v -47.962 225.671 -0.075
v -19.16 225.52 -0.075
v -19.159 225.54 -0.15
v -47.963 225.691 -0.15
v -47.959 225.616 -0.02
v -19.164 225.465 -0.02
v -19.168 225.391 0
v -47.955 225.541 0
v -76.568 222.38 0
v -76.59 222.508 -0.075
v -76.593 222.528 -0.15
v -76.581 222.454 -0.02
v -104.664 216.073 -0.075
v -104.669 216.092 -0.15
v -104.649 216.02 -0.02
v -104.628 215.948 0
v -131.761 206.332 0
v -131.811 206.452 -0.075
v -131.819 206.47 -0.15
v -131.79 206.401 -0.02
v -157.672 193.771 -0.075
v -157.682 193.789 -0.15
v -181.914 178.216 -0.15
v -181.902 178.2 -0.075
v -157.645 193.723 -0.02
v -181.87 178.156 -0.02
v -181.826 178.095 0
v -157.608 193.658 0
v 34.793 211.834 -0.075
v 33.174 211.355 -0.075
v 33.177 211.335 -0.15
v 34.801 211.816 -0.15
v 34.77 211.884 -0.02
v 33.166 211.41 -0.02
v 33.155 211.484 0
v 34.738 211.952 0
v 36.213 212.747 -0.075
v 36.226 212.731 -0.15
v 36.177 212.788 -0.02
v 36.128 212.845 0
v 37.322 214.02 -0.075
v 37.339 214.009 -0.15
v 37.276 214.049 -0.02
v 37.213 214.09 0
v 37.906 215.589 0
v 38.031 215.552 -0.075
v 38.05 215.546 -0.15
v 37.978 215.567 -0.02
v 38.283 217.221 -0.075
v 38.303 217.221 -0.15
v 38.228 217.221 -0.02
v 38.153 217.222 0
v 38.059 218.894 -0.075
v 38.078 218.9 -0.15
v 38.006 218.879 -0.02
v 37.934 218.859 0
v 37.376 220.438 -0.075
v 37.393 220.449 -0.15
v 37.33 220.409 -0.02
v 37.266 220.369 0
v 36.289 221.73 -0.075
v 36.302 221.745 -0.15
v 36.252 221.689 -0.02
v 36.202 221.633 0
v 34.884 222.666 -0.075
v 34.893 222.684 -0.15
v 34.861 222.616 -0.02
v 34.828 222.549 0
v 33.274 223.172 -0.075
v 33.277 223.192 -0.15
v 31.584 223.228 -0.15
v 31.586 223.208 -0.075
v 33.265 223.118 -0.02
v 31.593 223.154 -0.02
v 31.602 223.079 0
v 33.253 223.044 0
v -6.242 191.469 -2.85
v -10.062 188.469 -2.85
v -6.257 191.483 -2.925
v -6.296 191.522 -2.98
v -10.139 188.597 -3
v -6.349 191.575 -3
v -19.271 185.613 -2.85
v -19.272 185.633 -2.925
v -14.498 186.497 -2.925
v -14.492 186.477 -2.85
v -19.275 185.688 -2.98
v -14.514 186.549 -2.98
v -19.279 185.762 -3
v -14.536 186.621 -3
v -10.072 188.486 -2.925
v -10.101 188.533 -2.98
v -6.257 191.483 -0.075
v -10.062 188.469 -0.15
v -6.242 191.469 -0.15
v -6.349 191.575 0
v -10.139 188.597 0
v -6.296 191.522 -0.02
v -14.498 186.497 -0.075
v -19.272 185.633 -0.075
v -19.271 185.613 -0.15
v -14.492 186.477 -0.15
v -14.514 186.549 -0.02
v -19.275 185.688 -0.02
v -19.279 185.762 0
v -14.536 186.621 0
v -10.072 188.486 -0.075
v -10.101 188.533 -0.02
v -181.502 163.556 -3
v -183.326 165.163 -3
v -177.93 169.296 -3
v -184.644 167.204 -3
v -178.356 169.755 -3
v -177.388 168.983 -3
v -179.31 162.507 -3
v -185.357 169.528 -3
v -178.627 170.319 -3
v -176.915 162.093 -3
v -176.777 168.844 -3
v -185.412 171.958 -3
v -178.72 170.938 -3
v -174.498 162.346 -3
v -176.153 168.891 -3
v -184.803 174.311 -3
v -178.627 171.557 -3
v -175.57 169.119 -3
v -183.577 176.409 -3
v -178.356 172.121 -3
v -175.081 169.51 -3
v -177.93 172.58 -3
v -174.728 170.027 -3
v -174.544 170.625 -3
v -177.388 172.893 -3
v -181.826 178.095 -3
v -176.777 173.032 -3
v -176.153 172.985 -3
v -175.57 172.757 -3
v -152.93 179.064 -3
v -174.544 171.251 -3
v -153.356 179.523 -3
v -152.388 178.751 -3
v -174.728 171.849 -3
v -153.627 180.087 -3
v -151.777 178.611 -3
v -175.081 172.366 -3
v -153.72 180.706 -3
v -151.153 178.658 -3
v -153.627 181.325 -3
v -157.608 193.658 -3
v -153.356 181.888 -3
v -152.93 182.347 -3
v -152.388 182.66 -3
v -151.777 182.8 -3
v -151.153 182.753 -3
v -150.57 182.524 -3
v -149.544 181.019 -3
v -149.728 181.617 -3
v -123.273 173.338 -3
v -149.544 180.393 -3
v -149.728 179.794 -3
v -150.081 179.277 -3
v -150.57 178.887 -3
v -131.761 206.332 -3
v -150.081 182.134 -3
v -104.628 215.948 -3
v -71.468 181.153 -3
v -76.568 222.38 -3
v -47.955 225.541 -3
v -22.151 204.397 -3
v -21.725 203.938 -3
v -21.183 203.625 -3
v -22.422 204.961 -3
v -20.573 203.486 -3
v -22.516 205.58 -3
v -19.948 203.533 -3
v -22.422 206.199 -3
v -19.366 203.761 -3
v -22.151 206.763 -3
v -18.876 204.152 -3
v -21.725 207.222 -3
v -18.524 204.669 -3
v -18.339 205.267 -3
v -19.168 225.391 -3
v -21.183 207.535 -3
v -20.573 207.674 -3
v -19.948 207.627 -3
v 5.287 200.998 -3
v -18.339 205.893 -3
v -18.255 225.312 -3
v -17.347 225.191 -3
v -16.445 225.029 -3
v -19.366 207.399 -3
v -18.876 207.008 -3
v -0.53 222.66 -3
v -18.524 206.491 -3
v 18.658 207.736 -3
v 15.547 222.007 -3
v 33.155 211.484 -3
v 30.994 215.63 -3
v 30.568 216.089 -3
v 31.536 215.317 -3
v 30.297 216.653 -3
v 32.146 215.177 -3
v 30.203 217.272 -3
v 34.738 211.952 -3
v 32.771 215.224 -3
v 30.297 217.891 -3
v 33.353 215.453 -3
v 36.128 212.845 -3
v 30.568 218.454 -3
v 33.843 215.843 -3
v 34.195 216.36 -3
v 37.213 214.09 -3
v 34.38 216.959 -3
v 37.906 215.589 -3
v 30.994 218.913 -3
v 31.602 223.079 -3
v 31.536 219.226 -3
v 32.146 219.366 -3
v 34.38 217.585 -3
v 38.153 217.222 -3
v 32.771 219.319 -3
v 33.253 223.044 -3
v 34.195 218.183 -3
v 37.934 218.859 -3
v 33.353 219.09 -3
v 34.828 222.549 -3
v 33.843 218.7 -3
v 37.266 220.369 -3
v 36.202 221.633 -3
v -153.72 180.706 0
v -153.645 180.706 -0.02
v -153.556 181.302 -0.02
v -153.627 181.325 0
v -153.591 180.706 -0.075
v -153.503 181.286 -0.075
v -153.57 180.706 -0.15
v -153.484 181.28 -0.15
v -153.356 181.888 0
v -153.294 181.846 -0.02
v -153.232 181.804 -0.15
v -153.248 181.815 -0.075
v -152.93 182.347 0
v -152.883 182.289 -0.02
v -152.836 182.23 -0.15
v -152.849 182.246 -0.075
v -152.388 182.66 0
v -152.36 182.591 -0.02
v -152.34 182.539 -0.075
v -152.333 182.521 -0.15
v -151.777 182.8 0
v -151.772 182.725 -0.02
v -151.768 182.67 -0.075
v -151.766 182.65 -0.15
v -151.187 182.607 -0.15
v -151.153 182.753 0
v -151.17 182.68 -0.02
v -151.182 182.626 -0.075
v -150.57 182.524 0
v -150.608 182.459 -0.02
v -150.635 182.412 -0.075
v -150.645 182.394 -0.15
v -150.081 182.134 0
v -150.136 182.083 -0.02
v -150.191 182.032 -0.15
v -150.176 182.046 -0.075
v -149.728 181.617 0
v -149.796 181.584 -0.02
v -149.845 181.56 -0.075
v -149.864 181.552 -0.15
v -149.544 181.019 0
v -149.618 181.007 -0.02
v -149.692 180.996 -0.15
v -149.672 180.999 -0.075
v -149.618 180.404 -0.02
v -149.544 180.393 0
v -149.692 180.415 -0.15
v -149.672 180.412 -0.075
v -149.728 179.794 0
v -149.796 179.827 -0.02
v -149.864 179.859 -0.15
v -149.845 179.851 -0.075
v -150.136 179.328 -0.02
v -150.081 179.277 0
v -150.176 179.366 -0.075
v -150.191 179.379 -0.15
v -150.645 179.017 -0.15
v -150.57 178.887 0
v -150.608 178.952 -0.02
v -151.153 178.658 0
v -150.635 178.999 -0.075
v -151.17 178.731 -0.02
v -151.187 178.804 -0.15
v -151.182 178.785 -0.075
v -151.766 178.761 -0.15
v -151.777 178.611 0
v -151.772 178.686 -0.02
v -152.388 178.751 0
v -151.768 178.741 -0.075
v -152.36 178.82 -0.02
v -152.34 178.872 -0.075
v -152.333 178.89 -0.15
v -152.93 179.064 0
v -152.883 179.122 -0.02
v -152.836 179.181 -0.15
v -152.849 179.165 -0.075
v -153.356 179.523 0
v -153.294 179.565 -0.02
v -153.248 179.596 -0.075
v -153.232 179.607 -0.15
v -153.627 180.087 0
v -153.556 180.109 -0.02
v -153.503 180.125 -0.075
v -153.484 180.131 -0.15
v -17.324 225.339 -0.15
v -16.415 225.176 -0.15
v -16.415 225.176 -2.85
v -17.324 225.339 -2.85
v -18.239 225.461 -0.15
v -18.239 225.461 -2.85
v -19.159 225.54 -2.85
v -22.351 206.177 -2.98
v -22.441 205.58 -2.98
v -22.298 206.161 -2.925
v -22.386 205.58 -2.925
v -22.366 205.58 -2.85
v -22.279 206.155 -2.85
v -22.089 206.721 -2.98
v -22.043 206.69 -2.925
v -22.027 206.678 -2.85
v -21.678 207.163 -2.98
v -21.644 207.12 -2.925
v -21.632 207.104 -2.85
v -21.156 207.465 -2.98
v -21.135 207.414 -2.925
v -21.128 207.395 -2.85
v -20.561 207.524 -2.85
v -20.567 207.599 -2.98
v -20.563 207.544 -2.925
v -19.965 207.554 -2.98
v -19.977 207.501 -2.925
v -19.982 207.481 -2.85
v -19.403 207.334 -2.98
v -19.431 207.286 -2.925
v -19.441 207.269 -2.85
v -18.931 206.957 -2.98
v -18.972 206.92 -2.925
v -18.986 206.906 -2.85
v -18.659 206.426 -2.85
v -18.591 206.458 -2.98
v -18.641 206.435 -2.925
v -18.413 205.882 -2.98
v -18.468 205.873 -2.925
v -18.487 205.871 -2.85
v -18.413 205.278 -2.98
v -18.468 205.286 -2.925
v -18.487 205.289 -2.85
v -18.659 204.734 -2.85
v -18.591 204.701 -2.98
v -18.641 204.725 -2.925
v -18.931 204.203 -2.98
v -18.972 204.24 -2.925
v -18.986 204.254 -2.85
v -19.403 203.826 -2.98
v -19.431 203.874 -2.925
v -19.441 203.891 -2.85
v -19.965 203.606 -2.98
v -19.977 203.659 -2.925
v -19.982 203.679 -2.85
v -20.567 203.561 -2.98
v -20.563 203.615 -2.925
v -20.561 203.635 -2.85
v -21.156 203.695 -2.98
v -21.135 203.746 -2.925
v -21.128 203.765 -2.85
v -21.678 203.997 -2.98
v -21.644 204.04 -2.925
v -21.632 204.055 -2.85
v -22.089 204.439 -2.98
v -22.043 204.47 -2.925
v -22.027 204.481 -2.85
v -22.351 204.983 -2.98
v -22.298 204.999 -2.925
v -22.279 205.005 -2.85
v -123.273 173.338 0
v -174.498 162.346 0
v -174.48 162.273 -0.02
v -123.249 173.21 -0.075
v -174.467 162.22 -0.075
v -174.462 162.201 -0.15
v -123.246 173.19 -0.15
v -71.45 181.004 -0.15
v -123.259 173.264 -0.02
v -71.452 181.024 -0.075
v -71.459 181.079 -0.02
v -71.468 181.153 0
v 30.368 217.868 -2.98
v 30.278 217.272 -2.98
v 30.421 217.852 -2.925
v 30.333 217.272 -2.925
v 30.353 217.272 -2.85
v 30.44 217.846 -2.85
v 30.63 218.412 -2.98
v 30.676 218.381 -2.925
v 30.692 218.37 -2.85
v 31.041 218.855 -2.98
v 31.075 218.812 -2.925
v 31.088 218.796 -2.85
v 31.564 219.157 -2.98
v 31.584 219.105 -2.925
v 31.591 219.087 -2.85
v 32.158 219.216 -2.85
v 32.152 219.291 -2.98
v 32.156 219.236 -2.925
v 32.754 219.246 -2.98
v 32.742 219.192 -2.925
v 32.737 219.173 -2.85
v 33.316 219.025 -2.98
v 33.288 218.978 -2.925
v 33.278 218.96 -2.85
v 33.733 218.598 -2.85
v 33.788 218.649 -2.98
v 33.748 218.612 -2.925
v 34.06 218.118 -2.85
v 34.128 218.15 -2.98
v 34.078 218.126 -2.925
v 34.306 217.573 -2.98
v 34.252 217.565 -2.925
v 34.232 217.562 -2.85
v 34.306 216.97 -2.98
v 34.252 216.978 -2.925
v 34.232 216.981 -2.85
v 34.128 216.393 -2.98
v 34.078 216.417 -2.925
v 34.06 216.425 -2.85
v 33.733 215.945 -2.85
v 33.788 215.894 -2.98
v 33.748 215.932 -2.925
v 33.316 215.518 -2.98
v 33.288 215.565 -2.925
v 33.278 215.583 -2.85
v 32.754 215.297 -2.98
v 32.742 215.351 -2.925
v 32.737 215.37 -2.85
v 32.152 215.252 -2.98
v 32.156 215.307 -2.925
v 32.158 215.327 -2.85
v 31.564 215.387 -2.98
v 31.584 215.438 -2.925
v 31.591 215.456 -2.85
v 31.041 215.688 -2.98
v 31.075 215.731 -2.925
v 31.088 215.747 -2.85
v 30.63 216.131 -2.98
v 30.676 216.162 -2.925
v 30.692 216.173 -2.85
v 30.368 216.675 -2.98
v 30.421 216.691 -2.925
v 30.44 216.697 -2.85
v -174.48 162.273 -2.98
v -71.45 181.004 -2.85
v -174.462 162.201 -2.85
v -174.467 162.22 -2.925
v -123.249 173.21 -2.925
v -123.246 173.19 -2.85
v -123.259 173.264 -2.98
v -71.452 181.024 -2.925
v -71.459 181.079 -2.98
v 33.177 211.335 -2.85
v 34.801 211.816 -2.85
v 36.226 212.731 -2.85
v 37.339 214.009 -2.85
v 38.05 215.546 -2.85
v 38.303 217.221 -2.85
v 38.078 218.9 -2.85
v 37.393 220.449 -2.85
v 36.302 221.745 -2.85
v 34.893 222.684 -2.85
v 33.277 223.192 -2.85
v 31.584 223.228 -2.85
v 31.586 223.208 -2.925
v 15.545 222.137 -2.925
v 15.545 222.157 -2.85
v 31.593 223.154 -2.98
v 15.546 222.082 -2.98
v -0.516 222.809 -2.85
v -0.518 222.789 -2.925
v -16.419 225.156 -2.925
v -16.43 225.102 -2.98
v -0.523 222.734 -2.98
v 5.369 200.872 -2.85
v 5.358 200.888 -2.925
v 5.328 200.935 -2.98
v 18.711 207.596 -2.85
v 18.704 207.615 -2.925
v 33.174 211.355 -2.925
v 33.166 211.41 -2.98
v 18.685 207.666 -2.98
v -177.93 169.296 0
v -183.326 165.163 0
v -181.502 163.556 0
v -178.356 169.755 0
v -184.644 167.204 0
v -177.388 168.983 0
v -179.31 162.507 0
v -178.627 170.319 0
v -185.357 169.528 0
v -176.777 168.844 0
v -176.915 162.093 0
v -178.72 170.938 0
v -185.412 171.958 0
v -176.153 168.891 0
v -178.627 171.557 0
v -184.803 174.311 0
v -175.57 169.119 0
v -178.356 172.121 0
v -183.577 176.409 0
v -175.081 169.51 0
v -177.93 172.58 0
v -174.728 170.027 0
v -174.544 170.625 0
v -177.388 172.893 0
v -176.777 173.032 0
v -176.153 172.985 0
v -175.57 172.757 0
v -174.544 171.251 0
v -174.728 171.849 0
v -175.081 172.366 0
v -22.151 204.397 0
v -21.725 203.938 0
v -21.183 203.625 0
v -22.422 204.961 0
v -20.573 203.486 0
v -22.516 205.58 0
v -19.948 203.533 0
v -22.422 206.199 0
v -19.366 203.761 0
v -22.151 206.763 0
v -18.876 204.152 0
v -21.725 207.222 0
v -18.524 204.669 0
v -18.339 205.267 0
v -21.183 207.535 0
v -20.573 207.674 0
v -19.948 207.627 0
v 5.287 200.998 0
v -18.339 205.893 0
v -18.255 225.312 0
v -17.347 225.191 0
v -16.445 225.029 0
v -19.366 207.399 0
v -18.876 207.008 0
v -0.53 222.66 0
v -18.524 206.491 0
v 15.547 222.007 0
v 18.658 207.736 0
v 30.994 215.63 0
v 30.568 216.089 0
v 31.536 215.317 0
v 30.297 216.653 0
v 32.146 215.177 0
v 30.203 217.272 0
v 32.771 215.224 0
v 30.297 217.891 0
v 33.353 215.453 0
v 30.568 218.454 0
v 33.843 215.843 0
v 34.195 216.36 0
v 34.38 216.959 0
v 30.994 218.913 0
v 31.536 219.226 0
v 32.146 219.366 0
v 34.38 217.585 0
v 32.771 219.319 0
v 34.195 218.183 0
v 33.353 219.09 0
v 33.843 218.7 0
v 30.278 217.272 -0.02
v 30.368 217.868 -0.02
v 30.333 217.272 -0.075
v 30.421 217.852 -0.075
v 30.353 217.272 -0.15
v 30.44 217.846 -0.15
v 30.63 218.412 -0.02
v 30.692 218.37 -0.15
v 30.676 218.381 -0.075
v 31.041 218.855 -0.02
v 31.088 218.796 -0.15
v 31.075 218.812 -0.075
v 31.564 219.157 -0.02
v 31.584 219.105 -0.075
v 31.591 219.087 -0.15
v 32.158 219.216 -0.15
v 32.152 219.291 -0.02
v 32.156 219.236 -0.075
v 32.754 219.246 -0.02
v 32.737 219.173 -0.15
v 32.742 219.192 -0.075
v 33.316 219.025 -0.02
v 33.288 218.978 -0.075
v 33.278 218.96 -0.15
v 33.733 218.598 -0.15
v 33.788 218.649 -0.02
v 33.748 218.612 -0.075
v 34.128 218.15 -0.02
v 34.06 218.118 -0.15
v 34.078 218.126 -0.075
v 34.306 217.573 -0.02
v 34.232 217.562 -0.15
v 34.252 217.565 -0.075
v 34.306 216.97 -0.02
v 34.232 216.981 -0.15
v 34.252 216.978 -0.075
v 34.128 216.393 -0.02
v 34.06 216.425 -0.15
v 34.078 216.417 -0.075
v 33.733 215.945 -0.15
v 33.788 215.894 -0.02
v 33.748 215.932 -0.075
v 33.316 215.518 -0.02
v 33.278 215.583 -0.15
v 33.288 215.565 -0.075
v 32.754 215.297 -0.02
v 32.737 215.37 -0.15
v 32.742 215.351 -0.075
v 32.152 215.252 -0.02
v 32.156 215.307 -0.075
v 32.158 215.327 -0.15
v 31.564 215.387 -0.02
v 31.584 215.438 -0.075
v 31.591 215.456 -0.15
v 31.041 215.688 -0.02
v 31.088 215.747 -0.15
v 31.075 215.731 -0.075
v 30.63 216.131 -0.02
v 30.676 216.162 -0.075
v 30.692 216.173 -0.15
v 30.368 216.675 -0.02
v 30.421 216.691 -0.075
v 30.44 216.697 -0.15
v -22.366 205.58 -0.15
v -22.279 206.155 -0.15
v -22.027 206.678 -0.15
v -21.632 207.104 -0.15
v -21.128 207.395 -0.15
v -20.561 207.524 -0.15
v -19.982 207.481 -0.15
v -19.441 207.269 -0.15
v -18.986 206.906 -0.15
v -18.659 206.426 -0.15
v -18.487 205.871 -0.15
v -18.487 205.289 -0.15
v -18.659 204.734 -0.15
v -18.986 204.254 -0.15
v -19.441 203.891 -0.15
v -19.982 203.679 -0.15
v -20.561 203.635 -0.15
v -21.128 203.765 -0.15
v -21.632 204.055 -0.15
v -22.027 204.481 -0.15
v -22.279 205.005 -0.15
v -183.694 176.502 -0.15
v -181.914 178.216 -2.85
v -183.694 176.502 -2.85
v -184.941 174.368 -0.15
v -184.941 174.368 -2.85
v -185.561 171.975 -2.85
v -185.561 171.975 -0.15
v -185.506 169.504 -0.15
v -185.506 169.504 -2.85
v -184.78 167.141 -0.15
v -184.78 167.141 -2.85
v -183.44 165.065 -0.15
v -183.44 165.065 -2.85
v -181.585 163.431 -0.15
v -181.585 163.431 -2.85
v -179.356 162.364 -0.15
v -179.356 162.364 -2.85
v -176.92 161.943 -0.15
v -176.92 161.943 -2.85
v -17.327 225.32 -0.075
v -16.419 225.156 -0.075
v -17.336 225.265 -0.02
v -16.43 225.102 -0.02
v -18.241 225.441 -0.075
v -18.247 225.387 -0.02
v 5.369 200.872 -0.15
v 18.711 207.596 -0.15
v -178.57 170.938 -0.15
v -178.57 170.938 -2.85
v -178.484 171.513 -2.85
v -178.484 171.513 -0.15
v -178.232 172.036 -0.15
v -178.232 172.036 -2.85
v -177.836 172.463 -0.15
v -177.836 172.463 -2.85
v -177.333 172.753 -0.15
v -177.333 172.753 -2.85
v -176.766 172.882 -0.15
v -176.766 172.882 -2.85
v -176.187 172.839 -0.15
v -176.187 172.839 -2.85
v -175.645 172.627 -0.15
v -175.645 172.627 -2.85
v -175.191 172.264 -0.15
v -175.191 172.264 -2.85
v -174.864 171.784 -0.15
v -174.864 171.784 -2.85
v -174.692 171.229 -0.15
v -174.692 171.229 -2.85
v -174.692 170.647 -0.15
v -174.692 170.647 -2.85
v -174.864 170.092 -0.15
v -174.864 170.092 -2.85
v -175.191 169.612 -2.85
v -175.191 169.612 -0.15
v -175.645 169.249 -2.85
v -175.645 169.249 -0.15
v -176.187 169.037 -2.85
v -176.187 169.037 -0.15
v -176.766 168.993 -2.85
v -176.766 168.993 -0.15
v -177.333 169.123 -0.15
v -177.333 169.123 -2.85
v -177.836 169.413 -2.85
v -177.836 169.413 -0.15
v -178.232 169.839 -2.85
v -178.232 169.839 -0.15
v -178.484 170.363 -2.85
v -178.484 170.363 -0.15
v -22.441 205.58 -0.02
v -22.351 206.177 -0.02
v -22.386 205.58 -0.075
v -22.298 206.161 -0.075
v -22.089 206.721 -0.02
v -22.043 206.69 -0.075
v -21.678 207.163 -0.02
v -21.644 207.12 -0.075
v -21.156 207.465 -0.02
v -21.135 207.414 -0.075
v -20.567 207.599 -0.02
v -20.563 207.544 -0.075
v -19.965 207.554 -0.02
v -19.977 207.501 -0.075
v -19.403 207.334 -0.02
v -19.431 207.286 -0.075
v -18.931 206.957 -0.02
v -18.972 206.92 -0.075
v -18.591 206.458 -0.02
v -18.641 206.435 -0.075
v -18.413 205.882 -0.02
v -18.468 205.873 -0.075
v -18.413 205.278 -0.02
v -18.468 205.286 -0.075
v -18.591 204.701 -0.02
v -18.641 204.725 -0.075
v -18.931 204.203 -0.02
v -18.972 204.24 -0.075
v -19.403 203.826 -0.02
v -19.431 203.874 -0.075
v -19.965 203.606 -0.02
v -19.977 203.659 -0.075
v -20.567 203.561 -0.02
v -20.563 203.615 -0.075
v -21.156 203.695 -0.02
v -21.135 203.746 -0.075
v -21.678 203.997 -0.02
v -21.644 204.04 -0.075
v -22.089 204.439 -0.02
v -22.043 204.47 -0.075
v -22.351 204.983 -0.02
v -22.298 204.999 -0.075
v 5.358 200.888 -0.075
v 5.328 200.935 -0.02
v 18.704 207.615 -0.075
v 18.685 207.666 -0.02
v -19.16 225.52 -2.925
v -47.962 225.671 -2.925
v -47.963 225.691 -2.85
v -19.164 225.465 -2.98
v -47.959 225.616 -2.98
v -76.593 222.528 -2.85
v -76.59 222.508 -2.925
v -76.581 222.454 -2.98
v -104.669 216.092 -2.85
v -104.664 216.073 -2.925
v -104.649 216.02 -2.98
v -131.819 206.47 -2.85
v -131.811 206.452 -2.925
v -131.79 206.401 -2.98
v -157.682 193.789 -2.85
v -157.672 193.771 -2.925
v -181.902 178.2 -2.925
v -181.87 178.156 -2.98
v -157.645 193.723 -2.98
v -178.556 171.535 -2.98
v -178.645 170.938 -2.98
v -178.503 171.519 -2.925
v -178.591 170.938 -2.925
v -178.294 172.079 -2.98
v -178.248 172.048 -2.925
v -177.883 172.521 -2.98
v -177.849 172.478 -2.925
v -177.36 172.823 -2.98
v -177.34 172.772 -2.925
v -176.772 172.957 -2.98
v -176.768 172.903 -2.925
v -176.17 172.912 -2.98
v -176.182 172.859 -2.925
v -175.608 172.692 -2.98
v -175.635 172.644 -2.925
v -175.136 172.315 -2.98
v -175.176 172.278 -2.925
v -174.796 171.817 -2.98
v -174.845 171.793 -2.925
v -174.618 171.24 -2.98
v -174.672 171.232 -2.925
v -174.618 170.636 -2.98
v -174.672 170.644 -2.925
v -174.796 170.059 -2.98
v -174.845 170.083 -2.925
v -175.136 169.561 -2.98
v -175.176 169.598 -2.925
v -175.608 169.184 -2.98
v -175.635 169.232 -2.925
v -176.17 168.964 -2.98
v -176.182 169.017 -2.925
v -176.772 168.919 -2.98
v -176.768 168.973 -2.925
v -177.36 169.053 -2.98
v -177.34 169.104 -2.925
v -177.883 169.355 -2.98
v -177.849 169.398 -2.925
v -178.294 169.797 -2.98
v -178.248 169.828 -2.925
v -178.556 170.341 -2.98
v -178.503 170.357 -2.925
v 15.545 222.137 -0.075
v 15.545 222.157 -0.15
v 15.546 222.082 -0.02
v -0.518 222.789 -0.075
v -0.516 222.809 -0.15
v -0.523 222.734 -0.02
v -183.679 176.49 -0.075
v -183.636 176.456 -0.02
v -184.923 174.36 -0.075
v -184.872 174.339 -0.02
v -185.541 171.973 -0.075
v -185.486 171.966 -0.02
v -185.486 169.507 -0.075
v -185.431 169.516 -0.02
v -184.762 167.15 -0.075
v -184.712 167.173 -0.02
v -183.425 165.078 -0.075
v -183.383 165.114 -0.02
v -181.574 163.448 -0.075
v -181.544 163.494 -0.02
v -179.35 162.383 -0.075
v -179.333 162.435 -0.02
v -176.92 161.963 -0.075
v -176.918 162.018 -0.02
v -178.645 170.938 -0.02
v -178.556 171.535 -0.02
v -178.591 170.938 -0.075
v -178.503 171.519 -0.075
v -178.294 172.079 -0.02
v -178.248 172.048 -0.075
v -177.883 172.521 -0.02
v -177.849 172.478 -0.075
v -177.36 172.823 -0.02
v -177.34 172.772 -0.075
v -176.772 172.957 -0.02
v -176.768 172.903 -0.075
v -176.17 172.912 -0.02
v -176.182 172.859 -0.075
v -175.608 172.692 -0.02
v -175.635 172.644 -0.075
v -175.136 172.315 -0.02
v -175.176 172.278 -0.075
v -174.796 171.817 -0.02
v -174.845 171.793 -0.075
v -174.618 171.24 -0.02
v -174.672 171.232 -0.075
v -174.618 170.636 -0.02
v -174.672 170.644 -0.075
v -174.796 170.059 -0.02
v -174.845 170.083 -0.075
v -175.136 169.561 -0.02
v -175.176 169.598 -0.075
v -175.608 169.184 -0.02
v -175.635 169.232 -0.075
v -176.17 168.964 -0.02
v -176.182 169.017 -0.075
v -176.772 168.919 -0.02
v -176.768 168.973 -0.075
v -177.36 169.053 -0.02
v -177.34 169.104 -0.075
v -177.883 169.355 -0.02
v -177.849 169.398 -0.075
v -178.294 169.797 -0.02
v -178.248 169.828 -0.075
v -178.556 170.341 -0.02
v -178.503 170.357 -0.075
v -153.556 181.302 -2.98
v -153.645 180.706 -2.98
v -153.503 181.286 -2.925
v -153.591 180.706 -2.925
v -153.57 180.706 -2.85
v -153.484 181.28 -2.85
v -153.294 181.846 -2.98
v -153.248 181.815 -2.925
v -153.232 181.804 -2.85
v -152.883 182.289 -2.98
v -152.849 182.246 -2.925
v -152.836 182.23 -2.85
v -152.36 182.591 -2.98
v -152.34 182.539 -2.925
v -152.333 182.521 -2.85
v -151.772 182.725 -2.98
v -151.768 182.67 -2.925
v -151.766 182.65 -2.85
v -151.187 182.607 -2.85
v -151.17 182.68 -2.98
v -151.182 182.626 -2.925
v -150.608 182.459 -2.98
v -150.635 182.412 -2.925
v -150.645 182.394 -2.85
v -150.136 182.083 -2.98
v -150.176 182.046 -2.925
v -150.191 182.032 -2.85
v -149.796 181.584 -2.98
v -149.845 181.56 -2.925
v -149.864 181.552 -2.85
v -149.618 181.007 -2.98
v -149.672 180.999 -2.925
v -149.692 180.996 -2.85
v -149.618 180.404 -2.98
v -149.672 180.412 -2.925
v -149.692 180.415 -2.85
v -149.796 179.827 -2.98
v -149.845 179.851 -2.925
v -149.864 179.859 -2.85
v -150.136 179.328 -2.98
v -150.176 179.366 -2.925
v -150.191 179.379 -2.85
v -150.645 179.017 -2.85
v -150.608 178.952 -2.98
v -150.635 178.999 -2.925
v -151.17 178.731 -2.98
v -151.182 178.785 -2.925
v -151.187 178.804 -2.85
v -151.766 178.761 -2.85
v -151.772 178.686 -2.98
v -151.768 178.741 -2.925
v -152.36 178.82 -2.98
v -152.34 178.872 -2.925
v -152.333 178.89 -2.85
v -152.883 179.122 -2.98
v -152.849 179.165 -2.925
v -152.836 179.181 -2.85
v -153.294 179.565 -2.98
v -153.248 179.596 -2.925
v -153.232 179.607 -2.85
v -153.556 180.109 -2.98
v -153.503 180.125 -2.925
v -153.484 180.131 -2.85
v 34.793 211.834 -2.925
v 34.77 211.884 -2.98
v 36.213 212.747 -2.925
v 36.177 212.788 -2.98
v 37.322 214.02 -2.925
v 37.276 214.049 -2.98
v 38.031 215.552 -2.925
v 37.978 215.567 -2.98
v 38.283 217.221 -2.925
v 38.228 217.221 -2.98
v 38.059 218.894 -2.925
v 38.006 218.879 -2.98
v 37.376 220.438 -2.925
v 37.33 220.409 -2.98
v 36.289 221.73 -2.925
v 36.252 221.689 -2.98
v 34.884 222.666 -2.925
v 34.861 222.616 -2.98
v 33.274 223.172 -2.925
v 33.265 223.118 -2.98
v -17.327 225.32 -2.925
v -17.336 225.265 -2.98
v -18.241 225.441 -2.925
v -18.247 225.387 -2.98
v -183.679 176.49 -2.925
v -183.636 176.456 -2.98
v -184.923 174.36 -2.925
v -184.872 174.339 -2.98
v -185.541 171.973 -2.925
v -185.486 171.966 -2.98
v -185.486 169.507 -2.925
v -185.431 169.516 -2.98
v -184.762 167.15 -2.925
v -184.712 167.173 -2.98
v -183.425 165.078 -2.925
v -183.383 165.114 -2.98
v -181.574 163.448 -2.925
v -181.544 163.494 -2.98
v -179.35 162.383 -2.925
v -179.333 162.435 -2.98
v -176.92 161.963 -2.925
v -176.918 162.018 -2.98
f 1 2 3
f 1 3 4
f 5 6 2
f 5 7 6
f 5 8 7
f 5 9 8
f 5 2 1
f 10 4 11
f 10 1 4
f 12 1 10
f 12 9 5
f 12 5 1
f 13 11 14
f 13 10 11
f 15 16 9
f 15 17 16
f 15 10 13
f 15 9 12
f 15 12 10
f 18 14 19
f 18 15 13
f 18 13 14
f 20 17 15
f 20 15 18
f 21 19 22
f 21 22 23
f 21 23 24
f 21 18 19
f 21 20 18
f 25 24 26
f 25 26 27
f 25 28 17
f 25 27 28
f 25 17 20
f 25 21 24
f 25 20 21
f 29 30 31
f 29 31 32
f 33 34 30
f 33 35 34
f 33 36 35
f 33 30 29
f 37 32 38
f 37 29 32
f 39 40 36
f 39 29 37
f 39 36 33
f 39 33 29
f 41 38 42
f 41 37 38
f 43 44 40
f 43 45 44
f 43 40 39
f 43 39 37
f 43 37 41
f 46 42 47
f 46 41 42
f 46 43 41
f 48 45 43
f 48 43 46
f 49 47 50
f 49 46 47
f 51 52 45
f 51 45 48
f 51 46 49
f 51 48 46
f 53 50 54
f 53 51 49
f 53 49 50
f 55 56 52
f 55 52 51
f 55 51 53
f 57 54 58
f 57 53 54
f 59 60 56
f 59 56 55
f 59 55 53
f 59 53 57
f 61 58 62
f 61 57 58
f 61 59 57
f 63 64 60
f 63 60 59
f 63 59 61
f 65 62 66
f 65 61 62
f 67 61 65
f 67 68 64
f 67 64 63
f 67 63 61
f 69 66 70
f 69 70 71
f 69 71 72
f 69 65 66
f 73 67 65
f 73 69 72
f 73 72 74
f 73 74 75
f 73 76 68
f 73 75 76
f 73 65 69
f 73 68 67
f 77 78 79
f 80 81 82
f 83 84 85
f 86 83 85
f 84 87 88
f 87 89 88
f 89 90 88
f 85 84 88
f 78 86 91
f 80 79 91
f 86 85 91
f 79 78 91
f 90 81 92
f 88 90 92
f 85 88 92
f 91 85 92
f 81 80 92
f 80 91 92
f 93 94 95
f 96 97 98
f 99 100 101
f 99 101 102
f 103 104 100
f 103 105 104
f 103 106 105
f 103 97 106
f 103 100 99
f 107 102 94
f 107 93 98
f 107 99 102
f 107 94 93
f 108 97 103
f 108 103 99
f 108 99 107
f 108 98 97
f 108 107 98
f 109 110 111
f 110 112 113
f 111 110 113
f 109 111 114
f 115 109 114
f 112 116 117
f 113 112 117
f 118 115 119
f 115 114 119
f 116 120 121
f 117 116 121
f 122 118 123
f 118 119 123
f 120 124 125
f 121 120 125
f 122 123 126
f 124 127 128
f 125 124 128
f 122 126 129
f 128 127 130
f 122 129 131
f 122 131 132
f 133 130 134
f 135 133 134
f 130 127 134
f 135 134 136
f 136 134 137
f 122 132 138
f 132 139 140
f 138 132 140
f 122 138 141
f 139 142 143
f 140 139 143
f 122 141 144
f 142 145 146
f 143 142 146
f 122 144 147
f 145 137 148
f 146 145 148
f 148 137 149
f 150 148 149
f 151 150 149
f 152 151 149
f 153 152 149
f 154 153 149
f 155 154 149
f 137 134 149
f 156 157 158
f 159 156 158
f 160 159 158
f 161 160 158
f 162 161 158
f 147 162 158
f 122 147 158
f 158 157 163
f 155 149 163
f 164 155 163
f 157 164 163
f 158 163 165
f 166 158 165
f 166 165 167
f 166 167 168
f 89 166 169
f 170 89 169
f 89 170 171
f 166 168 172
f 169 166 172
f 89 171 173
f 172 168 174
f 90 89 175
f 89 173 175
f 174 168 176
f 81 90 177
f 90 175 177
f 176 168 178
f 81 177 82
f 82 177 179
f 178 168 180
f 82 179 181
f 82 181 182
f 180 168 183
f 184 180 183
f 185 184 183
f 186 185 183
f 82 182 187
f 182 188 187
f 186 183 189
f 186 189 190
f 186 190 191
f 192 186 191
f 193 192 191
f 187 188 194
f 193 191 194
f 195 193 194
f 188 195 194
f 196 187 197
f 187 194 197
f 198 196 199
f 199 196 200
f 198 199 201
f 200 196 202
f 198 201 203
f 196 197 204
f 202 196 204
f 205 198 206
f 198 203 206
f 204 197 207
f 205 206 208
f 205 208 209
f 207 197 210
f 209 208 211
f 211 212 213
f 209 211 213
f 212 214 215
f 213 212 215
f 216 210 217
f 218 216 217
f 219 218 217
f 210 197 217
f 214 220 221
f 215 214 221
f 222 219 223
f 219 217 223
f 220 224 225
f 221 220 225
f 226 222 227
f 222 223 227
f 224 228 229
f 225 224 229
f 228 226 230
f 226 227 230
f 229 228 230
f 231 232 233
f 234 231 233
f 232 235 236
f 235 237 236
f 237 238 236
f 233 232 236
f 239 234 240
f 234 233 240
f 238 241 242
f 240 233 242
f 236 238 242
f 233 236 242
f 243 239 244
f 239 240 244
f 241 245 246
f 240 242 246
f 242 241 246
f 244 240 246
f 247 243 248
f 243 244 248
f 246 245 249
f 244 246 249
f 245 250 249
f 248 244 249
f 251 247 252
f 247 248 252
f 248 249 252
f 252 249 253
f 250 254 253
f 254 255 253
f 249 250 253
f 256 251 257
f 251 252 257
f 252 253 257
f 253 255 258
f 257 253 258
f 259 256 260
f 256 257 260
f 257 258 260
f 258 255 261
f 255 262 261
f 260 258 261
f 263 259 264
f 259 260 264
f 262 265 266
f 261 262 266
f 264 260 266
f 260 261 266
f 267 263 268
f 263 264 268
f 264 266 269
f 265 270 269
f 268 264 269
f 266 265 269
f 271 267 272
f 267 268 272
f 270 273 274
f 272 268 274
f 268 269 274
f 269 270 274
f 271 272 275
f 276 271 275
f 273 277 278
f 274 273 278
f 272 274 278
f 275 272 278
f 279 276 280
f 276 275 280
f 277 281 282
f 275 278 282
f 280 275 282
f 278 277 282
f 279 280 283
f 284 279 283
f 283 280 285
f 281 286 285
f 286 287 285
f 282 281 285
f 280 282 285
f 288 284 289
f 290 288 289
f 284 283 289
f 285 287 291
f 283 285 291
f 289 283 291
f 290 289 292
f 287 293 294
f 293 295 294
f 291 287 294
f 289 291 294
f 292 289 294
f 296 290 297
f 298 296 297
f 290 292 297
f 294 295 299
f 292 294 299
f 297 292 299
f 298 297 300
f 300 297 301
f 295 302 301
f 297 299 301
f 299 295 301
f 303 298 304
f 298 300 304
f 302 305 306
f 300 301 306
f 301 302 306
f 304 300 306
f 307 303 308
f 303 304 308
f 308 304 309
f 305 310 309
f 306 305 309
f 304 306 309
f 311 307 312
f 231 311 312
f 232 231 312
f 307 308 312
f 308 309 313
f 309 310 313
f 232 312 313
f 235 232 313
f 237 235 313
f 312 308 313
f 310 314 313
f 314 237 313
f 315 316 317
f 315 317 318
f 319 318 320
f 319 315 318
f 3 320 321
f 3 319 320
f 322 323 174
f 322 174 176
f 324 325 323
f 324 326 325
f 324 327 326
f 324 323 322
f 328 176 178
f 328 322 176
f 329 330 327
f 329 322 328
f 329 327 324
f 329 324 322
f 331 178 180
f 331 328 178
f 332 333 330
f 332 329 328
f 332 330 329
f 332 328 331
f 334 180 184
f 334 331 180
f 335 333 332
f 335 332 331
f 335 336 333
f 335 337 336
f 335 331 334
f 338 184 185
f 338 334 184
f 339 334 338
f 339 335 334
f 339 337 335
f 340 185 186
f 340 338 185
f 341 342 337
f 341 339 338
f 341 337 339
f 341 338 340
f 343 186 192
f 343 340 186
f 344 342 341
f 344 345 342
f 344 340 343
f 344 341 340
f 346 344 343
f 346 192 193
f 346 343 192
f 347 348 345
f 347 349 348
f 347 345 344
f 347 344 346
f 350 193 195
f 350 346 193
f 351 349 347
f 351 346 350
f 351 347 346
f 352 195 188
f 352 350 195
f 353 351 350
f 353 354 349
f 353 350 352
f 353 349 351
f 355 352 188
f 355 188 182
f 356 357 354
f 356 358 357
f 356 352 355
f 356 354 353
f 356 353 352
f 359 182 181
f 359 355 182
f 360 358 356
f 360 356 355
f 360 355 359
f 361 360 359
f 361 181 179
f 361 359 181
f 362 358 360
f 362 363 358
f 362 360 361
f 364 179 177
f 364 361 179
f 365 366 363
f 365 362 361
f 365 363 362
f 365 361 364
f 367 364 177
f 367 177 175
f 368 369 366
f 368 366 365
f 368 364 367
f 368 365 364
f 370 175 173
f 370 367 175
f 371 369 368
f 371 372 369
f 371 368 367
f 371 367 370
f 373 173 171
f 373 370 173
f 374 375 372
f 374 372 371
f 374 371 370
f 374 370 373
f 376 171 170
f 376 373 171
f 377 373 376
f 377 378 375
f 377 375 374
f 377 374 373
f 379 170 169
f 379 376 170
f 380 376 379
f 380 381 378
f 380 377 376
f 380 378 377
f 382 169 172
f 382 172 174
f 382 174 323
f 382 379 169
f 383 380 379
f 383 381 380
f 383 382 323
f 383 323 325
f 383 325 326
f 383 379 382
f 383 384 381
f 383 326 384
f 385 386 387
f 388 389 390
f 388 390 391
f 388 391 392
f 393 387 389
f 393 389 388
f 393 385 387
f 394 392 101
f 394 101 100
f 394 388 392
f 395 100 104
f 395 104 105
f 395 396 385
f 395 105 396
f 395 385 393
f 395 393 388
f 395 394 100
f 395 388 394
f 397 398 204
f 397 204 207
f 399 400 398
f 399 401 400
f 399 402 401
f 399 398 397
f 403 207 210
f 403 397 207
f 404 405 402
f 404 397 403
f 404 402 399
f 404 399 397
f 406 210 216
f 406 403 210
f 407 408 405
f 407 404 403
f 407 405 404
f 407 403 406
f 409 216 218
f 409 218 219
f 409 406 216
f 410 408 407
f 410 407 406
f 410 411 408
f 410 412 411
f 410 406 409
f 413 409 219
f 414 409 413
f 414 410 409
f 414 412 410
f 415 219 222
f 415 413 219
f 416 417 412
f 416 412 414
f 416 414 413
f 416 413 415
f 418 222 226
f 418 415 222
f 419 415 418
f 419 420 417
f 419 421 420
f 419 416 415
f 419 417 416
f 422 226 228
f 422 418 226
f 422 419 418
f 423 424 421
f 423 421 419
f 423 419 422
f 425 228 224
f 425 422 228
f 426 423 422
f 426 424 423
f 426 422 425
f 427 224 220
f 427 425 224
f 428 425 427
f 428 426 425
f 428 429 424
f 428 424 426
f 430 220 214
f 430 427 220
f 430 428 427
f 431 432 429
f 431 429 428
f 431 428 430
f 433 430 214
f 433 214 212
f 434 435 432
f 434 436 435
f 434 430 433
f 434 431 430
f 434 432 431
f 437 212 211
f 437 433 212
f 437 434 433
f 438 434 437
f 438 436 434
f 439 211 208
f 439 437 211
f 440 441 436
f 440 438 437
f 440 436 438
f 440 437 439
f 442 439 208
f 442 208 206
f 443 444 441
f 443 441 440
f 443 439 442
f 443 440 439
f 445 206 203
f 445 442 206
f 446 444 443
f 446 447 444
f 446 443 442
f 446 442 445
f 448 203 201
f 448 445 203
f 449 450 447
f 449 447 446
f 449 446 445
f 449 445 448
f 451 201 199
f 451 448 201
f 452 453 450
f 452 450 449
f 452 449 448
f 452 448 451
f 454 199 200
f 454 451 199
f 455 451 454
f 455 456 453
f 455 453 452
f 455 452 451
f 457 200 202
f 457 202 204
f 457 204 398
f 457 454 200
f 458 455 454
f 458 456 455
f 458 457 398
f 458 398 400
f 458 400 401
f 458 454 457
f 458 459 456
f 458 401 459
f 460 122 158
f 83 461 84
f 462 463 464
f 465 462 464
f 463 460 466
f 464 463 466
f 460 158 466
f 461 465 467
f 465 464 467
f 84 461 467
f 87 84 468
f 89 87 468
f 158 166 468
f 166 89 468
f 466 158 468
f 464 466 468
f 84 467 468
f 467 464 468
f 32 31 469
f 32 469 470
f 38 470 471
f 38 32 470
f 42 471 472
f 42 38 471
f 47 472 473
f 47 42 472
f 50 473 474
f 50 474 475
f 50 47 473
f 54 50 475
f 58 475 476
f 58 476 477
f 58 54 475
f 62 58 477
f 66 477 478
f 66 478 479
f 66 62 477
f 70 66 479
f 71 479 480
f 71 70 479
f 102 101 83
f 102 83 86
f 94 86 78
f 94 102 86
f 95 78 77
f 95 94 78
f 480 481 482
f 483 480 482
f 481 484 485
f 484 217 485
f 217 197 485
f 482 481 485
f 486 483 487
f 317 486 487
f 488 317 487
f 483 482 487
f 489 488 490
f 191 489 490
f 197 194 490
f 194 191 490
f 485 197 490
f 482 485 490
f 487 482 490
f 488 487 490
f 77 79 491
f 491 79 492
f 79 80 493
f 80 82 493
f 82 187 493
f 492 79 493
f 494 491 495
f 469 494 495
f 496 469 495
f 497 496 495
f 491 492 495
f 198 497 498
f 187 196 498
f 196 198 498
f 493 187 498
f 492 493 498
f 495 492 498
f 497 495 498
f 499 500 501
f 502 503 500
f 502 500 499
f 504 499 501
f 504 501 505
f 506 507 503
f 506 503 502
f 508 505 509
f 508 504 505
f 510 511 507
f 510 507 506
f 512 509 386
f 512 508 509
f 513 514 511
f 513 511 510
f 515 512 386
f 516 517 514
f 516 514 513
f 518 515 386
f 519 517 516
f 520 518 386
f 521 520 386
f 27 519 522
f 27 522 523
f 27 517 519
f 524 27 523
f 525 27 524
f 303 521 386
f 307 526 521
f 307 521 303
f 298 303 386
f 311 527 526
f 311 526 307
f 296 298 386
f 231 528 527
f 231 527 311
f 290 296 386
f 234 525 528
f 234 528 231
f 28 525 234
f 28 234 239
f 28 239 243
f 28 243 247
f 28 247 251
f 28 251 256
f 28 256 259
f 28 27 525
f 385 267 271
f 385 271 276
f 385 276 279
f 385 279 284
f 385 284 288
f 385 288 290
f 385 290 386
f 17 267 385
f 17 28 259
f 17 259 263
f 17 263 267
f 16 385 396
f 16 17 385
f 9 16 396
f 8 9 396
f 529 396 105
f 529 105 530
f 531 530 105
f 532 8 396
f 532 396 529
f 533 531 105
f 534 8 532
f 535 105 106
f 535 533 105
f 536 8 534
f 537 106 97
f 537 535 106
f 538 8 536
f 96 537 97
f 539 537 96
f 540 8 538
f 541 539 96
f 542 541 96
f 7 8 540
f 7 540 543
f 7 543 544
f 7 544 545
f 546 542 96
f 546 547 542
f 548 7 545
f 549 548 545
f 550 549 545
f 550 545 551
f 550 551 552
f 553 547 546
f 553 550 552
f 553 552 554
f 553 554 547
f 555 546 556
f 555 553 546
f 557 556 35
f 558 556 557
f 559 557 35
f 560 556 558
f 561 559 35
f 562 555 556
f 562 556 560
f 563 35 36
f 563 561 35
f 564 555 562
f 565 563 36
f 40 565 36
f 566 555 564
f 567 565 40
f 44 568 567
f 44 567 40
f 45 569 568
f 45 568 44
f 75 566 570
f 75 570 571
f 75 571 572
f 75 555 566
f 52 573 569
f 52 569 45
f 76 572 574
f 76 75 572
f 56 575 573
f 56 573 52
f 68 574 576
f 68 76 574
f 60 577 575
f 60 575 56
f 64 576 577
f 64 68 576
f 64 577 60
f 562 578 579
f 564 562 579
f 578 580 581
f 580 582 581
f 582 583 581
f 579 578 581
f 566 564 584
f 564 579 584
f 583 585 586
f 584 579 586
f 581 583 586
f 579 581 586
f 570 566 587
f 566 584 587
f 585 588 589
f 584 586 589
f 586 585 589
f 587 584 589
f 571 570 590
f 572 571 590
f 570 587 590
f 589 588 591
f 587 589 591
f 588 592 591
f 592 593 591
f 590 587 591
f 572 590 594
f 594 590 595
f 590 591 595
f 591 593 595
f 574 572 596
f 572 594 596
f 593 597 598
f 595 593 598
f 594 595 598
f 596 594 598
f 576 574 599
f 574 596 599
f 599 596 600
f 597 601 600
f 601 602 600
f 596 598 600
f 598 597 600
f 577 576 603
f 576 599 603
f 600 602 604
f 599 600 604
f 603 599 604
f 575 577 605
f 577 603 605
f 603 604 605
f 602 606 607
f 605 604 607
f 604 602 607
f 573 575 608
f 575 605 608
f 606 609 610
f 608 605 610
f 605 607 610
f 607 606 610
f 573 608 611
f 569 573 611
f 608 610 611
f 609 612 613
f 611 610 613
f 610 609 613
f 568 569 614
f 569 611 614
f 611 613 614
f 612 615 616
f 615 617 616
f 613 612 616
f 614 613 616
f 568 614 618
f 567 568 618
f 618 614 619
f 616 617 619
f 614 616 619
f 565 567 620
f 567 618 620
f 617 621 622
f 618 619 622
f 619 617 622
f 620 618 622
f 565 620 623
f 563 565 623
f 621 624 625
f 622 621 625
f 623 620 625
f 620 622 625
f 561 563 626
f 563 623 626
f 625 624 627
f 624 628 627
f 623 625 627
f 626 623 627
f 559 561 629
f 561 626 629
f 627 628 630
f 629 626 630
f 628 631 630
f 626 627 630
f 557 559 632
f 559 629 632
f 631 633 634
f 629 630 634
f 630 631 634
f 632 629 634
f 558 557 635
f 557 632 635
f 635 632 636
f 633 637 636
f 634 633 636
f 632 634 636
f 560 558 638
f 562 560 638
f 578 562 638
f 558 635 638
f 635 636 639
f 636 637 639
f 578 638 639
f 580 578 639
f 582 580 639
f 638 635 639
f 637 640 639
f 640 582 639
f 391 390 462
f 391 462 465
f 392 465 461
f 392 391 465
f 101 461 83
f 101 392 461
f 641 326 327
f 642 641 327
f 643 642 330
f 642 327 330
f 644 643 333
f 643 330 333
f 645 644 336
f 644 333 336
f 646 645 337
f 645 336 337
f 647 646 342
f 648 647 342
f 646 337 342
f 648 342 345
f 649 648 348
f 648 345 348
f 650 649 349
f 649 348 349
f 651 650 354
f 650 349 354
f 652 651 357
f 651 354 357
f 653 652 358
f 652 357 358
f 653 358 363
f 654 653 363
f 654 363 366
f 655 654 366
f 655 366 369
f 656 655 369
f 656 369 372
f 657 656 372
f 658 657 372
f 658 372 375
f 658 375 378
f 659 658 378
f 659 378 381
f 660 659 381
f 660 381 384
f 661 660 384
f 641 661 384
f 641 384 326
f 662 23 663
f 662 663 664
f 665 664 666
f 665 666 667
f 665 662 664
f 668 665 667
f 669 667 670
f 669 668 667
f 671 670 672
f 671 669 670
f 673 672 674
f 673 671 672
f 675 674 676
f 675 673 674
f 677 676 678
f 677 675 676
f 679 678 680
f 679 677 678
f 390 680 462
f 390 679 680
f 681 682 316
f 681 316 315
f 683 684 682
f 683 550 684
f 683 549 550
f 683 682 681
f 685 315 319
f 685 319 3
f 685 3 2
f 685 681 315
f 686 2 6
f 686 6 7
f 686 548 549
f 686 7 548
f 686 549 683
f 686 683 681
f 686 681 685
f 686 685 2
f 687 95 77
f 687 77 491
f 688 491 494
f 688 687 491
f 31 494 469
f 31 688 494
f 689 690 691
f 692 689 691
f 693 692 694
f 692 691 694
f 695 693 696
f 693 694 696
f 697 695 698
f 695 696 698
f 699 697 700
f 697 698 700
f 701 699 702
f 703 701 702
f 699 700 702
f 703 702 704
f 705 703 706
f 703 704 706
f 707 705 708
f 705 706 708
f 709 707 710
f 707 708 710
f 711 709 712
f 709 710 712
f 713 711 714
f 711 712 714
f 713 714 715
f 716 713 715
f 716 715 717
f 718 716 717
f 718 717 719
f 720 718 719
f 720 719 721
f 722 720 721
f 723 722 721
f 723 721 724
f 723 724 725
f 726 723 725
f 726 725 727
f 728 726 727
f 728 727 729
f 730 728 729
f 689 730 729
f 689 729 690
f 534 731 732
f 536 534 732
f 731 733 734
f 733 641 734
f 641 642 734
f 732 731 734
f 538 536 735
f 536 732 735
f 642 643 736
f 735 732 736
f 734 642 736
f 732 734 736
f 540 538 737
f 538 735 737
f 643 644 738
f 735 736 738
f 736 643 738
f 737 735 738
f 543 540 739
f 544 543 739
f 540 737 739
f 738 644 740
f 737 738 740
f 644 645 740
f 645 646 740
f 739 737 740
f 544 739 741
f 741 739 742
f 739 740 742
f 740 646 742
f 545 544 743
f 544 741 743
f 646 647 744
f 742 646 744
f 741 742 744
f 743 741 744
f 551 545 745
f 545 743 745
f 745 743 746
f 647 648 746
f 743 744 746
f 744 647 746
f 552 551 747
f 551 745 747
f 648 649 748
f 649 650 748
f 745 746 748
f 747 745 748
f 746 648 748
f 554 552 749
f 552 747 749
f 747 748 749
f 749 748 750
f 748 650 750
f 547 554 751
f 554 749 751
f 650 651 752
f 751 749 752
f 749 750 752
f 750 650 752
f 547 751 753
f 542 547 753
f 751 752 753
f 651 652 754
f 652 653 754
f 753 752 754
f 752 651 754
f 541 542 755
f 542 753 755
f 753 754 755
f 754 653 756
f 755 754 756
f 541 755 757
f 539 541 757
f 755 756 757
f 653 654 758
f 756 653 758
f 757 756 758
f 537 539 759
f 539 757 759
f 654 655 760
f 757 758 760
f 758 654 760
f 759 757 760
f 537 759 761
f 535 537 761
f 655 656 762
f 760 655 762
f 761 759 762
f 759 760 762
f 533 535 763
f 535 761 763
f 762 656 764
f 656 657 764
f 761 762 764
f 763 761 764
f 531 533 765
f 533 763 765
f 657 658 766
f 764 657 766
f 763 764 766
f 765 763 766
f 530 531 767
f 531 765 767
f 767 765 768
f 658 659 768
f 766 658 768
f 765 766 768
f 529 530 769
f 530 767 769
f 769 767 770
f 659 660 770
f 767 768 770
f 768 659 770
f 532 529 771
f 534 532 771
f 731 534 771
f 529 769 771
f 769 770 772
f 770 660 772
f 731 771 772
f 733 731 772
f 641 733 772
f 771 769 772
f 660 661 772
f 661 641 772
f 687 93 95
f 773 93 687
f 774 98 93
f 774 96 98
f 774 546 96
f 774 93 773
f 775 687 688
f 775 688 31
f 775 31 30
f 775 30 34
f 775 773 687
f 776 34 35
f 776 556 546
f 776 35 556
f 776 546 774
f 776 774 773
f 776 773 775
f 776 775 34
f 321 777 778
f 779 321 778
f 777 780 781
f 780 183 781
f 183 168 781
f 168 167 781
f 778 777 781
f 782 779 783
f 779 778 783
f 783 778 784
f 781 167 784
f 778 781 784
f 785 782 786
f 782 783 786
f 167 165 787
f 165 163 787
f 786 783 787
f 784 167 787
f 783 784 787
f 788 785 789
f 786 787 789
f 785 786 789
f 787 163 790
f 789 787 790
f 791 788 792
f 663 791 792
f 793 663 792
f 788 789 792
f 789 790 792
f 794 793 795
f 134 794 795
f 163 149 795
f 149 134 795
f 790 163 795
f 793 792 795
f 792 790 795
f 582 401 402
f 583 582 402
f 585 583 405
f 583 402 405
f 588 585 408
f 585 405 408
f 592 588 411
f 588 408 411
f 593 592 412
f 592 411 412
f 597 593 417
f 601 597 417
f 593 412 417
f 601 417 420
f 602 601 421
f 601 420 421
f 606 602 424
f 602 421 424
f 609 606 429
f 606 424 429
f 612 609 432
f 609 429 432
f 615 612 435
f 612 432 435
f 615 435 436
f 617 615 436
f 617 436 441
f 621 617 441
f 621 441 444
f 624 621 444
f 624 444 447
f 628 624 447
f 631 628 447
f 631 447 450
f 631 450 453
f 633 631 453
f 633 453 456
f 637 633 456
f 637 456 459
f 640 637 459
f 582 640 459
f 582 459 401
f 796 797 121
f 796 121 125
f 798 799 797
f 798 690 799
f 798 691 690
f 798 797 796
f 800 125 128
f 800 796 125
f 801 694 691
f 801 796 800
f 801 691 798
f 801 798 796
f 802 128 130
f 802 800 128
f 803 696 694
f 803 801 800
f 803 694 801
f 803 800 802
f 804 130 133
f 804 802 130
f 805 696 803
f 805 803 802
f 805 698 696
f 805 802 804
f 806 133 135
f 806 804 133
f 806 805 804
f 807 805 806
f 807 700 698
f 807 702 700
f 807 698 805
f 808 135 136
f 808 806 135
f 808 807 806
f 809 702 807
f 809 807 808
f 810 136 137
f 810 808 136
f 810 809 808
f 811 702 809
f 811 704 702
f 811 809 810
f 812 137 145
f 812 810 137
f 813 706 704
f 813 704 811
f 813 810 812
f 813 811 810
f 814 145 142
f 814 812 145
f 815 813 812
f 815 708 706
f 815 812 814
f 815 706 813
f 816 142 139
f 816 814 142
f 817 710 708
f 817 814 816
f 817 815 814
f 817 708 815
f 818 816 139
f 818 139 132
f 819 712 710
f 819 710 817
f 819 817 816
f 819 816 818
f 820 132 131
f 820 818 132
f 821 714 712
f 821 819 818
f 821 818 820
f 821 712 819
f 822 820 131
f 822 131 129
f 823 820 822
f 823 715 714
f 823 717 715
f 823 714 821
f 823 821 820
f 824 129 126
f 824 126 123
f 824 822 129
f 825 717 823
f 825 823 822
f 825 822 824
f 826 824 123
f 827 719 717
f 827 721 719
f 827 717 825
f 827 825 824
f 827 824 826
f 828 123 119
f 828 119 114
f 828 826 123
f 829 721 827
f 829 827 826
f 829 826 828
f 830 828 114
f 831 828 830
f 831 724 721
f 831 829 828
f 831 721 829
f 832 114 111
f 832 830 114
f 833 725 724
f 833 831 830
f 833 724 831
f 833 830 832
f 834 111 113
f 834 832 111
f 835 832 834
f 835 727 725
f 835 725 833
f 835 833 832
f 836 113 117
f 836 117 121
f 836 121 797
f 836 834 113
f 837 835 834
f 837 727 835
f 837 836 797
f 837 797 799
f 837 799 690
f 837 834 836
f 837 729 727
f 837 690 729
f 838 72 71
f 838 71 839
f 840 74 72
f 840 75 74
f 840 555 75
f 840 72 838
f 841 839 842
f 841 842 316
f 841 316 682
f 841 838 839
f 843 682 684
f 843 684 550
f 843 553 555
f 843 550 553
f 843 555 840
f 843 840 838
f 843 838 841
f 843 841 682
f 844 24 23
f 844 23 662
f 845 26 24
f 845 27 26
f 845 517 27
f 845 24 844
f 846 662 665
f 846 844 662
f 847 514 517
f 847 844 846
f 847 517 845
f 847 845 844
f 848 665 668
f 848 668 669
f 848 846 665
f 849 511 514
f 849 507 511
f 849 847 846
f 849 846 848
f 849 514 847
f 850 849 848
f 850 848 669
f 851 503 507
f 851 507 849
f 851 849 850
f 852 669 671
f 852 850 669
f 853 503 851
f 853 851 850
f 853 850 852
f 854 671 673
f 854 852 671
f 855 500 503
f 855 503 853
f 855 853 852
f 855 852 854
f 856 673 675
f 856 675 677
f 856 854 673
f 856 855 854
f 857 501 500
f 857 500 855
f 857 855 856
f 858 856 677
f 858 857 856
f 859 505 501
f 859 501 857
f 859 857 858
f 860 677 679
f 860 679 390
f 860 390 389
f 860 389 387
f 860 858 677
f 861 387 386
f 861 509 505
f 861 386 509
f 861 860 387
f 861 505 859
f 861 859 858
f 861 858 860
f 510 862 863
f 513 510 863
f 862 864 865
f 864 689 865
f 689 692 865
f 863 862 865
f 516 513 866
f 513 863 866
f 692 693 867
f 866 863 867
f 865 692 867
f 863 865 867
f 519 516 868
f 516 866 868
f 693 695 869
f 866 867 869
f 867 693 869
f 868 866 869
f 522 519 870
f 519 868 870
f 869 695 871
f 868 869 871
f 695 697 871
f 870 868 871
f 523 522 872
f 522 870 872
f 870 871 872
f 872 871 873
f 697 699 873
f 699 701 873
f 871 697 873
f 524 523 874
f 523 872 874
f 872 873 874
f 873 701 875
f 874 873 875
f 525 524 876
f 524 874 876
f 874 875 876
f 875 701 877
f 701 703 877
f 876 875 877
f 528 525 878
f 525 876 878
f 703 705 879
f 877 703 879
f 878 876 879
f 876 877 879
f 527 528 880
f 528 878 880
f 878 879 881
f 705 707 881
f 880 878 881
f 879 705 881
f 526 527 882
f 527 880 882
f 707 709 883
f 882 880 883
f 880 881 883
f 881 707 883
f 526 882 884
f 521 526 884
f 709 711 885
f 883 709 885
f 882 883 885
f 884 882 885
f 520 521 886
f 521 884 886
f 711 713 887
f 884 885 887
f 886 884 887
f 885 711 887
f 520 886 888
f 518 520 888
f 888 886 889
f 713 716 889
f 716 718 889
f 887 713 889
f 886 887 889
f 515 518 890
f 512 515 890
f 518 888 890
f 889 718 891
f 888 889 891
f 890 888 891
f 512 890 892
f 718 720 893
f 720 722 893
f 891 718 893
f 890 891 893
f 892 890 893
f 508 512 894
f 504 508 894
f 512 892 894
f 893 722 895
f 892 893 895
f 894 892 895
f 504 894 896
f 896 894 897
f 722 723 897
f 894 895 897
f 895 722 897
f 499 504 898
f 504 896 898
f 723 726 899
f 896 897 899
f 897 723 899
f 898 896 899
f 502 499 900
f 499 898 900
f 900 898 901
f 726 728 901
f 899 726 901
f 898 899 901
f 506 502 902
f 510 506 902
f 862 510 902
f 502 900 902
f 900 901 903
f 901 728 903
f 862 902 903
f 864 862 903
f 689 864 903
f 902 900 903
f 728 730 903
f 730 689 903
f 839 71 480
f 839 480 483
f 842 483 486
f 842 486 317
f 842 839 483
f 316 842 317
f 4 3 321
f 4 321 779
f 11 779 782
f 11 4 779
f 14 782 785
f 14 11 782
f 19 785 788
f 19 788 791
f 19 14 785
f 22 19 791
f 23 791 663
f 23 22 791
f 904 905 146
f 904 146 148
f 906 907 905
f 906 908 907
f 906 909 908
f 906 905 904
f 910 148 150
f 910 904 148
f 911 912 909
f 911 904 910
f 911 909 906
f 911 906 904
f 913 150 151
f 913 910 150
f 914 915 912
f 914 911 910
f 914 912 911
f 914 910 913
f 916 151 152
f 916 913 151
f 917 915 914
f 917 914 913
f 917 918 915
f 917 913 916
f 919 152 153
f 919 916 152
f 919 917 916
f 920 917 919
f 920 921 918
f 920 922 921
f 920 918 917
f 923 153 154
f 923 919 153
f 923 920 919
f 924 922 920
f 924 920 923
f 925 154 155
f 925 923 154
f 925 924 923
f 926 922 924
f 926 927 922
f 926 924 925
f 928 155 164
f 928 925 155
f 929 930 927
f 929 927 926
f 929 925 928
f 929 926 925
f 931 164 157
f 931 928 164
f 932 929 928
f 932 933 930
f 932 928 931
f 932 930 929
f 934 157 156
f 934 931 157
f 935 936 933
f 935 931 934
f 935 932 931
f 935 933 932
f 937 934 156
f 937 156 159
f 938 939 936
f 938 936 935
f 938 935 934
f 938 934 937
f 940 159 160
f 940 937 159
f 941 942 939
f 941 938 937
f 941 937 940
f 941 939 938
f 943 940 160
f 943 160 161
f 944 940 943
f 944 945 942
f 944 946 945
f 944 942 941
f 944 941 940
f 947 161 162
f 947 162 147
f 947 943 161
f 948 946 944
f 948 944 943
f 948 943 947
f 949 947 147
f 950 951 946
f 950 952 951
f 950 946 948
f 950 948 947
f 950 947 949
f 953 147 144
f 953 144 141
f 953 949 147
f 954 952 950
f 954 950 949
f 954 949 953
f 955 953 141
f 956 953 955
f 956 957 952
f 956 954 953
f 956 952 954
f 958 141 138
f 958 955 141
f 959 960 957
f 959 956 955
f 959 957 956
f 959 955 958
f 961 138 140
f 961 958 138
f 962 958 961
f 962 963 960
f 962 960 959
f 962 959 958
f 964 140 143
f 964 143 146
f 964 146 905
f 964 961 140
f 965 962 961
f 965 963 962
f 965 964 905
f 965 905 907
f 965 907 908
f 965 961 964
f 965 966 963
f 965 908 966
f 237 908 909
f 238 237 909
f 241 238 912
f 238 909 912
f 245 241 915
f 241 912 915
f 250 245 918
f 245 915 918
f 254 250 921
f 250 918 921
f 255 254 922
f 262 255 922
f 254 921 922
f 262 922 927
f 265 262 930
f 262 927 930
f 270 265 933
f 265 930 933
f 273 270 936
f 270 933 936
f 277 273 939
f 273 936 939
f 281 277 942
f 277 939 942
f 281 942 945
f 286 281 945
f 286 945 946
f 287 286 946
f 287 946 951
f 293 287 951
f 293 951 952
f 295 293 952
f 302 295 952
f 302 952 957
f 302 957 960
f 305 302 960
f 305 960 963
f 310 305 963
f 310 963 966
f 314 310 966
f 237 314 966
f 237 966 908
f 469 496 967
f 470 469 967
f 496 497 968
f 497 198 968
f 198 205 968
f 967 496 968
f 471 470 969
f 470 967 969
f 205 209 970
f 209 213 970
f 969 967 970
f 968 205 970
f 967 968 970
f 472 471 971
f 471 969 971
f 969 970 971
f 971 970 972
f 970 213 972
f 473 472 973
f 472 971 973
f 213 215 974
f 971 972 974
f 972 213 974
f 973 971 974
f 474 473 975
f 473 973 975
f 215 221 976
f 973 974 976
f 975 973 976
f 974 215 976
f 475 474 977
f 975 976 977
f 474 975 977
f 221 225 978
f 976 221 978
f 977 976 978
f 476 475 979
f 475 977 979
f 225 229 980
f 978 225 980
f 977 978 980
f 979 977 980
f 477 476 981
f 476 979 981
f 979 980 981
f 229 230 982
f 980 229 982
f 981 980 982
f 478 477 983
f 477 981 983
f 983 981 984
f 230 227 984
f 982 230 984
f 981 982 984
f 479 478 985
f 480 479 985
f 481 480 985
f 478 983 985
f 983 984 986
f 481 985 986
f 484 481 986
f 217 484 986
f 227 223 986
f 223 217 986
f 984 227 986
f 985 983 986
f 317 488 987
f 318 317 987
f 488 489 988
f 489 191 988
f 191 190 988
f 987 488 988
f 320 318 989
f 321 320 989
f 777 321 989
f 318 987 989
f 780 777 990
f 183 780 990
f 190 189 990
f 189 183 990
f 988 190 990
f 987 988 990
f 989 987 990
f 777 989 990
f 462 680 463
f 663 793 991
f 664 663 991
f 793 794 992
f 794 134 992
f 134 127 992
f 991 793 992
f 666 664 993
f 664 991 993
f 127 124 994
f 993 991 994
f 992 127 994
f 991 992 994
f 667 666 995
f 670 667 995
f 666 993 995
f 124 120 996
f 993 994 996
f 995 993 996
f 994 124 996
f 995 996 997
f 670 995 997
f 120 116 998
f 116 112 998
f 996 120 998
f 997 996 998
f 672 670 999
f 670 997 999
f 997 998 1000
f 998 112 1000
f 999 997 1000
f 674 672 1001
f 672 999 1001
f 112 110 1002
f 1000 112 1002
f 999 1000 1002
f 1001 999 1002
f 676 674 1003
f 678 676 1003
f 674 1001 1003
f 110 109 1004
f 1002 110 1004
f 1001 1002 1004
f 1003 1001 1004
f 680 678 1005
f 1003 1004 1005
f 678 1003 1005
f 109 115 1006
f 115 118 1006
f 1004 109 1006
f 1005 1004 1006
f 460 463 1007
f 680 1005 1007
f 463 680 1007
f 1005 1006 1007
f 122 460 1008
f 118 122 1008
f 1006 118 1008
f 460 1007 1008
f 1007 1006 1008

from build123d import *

# Parameters (mm, degrees)
BOSS_EXTRUDE1_DEPTH        = 3
M3_5_CLEARANCE_HOLE1_D     = 3.9
M3_5_CLEARANCE_HOLE1_DEPTH = 10
M3_5_CLEARANCE_HOLE1_TIP   = 1.171678207
FILLET1_R                  = 0.15


with BuildPart() as part:
    # Sketch1 → Boss-Extrude1 (new body)
    with BuildSketch(Plane.XY):
        with BuildLine():
            ThreePointArc((-174.462073609, 162.200582347), (-97.40794844, 177.496181026), (-19.270785815, 185.612668032))
            ThreePointArc((-19.270785815, 185.612668032), (-12.215961432, 187.338041165), (-6.242425057, 191.4689397))
            ThreePointArc((-6.242425057, 191.4689397), (11.860132573, 204.590718457), (33.176625244, 211.335406045))
            ThreePointArc((33.176625244, 211.335406045), (38.250302898, 218.068129213), (31.583549811, 223.228184393))
            ThreePointArc((31.583549811, 223.228184393), (7.505603441, 222.267982746), (-16.415402052, 225.175728416))
            ThreePointArc((-16.415402052, 225.175728416), (-17.780851121, 225.405550653), (-19.158929463, 225.540344964))
            ThreePointArc((-19.158929463, 225.540344964), (-104.669481606, 216.092378887), (-181.914127241, 178.216485348))
            ThreePointArc((-181.914127241, 178.216485348), (-184.780430481, 167.141182782), (-174.462073609, 162.200582347))
        make_face()
    extrude(amount=-BOSS_EXTRUDE1_DEPTH)

    # M3.5 Clearance Hole1
    with Locations(Plane.XY):
        with Locations((32.303419496, 217.271525293), (-20.415696686, 205.579870617), (-52.165696686, -1330.164308971), (-151.620485371, 180.705519261), (-176.620485371, 170.937930838)):
            Hole(M3_5_CLEARANCE_HOLE1_D / 2, depth=M3_5_CLEARANCE_HOLE1_DEPTH)
            with Locations((0, 0, -(M3_5_CLEARANCE_HOLE1_DEPTH + M3_5_CLEARANCE_HOLE1_TIP / 2))):  # 118° drill point
                Cone(0, M3_5_CLEARANCE_HOLE1_D / 2, M3_5_CLEARANCE_HOLE1_TIP, mode=Mode.SUBTRACT)

    # Fillet1
    fillet1_edges = [part.edges().sort_by_distance(p)[0] for p in [
        (-12.215961432, 187.338041165, -3),
        (-97.40794844, 177.496181026, 0),
        (-184.780430481, 167.141182782, 0),
        (11.860132573, 204.590718457, -3),
        (38.250302898, 218.068129213, -3),
        (7.505603441, 222.267982746, -3),
        (-17.780851121, 225.405550653, -3),
        (-104.669481606, 216.092378887, -3),
        (-174.670485371, 170.937930838, -3),
        (-174.670485371, 170.937930838, 0),
        (-149.670485371, 180.705519261, -3),
        (-149.670485371, 180.705519261, 0),
        (-18.465696686, 205.579870617, -3),
        (-18.465696686, 205.579870617, 0),
        (-184.780430481, 167.141182782, -3),
        (34.253419496, 217.271525293, -3),
        (34.253419496, 217.271525293, 0),
        (-97.40794844, 177.496181026, -3),
        (-104.669481606, 216.092378887, 0),
        (-17.780851121, 225.405550653, 0),
        (7.505603441, 222.267982746, 0),
        (38.250302898, 218.068129213, 0),
        (11.860132573, 204.590718457, 0),
        (-12.215961432, 187.338041165, 0),
    ]]
    fillet(fillet1_edges, radius=FILLET1_R)


solid = part.part
